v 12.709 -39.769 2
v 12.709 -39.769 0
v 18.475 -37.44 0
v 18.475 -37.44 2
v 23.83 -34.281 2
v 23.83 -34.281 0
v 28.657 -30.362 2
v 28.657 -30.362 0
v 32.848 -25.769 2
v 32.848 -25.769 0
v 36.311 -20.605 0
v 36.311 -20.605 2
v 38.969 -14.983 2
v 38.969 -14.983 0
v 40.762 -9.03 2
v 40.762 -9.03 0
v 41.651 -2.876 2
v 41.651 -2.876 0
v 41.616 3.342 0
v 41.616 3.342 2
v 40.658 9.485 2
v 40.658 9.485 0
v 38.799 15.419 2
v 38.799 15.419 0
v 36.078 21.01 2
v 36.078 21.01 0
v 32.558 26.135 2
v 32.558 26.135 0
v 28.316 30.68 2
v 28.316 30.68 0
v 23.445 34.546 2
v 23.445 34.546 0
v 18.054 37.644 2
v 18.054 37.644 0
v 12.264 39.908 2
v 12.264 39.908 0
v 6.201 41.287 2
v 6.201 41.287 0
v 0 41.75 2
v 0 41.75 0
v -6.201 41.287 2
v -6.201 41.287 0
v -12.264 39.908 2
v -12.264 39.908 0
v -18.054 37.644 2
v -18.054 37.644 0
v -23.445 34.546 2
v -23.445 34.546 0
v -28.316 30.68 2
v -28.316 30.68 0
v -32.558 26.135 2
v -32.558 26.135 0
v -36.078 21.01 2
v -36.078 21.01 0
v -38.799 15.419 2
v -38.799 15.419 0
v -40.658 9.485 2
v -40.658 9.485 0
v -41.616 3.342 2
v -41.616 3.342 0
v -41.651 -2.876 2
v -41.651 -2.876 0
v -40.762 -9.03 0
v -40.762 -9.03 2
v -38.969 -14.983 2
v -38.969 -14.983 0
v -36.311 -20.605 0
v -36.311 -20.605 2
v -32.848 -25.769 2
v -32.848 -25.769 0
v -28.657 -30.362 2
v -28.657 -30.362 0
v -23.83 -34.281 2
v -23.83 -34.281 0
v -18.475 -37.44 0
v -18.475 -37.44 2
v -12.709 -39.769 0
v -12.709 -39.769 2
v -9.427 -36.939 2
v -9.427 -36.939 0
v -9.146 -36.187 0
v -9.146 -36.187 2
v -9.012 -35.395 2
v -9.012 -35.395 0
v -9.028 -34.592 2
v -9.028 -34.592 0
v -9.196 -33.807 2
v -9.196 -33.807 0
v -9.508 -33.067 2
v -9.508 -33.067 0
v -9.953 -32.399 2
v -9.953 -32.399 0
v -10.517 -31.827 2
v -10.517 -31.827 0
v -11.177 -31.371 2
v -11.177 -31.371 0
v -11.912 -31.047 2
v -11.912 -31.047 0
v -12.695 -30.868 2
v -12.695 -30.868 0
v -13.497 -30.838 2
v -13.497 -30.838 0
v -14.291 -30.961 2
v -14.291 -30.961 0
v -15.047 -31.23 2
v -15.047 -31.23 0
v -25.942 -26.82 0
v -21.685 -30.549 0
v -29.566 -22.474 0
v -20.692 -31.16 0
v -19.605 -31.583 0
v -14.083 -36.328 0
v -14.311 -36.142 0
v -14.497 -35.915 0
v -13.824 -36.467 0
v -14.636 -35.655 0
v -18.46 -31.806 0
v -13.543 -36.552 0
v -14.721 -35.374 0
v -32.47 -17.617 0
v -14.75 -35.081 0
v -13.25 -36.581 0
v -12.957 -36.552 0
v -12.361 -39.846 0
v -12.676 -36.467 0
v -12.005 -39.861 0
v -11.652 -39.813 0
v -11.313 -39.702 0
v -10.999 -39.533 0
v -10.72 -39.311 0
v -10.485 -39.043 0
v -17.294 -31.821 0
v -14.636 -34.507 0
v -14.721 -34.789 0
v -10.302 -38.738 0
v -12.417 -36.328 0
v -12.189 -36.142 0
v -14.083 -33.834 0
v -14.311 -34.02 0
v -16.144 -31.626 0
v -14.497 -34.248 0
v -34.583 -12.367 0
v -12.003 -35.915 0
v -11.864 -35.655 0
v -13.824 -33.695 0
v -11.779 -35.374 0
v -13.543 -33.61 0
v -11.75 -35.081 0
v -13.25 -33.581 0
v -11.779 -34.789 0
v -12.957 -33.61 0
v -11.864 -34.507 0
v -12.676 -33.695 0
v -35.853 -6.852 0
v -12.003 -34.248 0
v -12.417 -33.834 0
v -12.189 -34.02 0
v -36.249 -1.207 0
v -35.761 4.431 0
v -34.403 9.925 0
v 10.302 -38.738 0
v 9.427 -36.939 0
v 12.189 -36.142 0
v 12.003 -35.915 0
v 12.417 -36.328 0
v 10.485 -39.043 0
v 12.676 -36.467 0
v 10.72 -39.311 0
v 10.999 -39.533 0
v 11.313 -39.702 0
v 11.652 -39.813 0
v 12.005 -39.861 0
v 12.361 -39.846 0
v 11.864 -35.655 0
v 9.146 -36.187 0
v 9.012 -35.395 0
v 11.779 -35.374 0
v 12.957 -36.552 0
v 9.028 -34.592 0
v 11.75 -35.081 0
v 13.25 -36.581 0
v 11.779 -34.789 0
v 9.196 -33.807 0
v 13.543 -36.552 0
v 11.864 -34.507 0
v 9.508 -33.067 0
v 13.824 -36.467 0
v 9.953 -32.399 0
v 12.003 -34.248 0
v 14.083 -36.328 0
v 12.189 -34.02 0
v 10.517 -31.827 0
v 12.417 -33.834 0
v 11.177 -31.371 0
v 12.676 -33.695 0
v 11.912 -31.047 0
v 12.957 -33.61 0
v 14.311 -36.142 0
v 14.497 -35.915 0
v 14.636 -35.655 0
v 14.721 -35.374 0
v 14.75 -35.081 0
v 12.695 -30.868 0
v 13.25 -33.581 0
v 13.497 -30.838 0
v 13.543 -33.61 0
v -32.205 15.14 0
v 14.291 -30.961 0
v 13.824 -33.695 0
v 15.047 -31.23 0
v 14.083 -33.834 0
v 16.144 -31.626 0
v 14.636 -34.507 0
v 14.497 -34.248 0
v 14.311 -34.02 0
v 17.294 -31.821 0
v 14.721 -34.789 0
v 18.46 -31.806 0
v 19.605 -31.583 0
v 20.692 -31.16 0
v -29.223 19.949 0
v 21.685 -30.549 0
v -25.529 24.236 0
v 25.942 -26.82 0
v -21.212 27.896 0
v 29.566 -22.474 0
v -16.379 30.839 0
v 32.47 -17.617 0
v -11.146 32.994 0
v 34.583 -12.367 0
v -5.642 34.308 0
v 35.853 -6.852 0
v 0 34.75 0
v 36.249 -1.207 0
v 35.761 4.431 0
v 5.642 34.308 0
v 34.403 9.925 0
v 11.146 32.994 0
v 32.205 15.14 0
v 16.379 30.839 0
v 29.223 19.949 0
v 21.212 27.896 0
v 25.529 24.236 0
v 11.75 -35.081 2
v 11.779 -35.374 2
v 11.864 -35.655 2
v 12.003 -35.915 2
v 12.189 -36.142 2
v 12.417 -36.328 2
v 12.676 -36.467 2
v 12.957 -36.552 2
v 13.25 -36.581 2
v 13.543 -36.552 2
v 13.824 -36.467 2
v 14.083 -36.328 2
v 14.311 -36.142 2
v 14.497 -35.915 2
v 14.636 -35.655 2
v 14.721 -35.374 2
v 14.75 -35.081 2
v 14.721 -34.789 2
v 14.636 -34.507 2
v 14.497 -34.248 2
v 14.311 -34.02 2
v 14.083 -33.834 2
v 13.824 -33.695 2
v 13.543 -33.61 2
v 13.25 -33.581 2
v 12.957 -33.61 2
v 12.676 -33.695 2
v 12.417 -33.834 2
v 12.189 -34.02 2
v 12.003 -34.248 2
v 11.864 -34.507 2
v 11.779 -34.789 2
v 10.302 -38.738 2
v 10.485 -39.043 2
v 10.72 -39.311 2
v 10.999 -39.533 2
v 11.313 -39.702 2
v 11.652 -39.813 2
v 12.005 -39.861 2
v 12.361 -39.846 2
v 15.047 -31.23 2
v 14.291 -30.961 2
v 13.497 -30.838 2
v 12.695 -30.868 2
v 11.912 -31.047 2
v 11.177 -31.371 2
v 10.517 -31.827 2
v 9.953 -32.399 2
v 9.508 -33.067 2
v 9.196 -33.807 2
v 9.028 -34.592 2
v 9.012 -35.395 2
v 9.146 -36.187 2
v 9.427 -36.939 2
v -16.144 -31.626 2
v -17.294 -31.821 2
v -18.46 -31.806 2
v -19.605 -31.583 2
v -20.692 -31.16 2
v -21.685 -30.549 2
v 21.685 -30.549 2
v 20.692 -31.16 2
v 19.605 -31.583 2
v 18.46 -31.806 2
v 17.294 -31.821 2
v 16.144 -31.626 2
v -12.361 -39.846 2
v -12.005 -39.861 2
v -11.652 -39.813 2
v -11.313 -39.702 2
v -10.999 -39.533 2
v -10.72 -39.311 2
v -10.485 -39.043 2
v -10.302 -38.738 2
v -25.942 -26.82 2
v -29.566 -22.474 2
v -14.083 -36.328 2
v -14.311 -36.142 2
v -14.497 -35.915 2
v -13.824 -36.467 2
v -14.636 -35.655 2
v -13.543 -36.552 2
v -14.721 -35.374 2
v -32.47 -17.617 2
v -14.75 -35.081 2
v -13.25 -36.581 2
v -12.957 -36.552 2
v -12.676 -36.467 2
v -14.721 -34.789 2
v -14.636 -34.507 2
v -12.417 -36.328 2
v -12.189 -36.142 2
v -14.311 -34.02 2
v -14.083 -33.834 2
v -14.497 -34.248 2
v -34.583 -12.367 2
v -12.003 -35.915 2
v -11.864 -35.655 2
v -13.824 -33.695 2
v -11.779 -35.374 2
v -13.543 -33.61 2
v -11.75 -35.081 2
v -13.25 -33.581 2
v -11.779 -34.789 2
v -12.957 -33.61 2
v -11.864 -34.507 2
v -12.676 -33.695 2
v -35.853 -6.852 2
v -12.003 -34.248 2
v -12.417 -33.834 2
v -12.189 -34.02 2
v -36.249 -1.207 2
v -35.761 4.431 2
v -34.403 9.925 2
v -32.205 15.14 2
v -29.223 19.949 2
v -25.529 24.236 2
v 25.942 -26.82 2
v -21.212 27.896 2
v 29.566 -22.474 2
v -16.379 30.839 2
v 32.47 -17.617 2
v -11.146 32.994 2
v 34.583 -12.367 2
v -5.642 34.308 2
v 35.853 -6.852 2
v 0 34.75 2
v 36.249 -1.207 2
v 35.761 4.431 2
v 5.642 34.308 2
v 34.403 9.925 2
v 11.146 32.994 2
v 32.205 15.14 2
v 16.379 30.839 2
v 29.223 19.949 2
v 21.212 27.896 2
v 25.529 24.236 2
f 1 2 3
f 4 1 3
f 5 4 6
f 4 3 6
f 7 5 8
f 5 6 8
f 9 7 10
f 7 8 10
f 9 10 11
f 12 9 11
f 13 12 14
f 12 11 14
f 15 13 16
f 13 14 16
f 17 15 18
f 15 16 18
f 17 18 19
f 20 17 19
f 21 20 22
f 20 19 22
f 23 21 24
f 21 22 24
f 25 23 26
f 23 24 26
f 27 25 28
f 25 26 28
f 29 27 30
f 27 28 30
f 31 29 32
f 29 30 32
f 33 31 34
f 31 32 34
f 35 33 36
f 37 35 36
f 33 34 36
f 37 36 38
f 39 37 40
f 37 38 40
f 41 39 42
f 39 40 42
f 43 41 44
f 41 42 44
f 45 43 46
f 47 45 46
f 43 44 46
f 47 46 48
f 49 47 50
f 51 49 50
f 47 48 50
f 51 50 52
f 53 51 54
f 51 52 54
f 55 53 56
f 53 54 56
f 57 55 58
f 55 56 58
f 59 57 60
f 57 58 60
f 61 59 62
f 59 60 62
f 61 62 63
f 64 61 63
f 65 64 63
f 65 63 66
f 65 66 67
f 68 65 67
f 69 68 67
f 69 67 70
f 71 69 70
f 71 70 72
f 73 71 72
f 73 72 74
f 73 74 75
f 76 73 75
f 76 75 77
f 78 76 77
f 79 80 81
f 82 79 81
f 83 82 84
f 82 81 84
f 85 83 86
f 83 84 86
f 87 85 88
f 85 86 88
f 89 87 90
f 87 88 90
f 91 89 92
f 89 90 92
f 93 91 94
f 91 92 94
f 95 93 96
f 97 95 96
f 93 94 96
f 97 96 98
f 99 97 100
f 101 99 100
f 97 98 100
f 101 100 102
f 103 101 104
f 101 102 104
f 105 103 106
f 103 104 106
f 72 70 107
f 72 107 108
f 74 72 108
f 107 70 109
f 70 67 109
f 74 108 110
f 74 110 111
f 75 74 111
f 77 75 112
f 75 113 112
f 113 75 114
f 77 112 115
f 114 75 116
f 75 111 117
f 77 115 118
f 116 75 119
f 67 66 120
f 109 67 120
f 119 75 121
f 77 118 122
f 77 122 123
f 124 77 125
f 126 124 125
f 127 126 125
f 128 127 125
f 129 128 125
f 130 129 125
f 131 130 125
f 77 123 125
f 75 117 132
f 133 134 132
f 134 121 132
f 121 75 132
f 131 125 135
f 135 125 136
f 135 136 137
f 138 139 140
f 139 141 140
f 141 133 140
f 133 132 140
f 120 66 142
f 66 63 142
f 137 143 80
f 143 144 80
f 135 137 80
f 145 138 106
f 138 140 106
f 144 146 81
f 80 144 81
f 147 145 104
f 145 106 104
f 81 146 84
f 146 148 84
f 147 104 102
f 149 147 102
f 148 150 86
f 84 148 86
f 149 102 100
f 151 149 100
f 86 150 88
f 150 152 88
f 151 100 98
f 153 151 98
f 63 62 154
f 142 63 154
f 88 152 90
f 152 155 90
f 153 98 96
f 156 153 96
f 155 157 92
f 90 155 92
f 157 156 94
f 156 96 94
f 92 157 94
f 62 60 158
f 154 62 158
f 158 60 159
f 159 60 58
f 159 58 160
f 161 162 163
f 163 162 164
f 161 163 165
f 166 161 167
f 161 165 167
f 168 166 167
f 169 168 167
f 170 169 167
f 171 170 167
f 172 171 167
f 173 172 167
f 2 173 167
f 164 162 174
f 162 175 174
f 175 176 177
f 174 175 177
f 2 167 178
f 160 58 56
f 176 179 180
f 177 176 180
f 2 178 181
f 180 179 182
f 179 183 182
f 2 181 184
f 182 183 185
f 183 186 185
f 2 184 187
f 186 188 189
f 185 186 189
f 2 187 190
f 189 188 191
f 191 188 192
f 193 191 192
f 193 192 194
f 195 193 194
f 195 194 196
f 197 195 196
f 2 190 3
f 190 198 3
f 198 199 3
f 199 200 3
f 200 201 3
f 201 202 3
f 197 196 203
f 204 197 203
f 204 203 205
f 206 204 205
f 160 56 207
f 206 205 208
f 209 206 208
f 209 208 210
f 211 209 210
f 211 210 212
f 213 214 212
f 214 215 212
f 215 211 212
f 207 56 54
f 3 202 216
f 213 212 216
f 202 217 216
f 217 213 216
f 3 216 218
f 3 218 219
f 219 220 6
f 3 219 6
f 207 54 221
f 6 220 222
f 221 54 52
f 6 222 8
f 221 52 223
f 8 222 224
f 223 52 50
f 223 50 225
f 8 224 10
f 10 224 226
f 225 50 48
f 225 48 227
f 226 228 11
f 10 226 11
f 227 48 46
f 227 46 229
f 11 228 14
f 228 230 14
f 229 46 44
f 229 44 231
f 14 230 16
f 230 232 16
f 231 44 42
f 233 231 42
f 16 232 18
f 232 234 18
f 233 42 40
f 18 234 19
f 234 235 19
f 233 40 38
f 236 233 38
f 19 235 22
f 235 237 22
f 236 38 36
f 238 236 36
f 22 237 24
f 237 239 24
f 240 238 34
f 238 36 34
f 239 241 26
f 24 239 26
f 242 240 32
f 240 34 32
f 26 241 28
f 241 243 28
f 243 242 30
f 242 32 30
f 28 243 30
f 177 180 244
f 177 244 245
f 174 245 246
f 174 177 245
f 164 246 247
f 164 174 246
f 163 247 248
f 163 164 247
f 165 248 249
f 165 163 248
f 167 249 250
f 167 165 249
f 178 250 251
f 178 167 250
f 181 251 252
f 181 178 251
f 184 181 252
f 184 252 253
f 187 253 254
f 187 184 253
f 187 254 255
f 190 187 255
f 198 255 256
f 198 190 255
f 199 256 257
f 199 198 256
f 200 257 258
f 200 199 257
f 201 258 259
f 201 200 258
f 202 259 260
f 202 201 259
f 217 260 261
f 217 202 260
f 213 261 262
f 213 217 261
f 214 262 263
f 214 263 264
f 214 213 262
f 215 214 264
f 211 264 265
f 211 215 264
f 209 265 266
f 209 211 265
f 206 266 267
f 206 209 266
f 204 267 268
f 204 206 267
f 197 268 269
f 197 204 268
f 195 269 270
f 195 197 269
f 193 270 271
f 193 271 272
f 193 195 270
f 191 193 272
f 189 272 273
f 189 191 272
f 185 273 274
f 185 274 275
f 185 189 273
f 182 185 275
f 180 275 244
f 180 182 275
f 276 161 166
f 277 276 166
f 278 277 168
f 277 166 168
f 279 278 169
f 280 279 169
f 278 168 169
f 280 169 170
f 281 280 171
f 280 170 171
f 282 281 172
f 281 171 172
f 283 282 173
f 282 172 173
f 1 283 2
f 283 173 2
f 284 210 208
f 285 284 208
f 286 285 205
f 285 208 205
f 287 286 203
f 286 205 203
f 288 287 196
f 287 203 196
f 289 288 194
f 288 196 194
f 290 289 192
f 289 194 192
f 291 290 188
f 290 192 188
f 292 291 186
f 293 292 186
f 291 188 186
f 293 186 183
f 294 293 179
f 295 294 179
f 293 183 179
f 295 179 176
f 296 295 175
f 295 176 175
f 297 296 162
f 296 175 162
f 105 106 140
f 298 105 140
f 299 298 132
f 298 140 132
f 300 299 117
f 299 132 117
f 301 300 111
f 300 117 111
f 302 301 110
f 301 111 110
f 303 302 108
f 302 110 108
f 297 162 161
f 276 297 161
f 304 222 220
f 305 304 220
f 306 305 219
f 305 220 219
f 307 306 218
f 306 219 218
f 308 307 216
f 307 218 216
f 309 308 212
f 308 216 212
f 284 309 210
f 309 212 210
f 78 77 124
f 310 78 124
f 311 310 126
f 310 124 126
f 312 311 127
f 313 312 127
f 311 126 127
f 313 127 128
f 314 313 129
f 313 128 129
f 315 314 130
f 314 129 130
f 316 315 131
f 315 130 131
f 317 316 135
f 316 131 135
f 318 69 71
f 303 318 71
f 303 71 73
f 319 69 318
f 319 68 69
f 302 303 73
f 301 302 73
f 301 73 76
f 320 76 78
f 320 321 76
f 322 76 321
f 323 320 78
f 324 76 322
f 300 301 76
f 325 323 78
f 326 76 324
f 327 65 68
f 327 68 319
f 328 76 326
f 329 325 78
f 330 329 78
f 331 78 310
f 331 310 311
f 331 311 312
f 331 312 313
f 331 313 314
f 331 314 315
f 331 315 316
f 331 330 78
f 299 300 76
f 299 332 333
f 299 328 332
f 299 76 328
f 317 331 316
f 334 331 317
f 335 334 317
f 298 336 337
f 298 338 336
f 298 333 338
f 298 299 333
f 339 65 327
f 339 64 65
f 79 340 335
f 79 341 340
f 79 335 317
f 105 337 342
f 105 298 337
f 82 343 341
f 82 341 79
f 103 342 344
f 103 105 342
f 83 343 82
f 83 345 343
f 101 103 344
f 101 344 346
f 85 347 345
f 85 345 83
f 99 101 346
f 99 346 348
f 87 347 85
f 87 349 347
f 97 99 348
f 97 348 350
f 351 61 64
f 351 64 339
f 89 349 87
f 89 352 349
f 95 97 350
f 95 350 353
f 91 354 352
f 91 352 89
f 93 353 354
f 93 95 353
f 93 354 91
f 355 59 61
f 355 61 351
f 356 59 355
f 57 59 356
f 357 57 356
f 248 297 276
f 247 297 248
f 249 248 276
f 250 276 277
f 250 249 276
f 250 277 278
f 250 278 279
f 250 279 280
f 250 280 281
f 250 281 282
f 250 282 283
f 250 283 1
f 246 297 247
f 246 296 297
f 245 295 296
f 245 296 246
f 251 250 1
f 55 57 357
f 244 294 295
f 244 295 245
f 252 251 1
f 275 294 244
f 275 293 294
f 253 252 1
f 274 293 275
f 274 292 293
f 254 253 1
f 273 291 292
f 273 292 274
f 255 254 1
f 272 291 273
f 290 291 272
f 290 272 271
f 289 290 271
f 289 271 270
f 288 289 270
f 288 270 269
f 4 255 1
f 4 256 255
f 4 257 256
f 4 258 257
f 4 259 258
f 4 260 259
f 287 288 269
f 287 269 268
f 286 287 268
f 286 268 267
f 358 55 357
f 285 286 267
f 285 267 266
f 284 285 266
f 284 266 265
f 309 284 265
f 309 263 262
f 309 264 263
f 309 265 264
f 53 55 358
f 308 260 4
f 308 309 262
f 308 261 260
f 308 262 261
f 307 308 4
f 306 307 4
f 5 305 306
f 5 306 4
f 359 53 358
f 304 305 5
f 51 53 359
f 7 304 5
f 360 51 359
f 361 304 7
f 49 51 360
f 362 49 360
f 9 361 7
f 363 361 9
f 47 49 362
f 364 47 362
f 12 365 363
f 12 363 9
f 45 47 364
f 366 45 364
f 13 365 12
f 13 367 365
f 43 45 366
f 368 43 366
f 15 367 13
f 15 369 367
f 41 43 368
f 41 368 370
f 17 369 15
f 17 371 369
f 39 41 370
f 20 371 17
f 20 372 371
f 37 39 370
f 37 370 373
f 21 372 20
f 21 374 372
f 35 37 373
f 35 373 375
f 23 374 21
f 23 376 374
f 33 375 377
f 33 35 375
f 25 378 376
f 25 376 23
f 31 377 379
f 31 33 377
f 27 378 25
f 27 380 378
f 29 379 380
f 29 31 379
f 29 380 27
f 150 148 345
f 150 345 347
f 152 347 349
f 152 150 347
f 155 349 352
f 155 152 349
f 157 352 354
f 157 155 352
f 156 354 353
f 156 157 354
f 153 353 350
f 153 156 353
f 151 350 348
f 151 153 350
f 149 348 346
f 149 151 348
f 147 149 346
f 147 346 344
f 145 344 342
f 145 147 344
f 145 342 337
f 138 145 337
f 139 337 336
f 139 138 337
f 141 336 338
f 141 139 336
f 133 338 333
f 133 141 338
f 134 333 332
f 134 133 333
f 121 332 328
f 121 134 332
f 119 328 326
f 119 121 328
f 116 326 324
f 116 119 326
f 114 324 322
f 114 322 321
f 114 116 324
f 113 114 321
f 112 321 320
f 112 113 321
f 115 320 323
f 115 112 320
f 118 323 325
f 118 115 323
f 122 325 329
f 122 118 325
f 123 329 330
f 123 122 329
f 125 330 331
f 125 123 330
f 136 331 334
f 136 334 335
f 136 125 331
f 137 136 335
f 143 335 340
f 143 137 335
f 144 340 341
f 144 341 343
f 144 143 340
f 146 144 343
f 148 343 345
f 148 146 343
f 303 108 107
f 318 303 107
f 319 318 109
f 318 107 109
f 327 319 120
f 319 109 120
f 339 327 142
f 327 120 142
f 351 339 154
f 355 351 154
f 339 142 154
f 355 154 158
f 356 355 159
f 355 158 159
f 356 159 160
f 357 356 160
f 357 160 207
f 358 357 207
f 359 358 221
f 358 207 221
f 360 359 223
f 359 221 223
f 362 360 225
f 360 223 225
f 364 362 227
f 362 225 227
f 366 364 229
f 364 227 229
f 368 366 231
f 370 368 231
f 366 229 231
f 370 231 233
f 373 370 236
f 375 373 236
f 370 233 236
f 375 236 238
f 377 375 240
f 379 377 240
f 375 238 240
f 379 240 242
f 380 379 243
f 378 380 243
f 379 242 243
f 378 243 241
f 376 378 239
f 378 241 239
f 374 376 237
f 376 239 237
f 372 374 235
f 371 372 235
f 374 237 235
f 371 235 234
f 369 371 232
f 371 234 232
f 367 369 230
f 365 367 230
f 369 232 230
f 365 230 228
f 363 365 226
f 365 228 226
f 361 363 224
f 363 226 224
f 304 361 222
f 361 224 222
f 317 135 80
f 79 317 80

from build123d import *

# Parameters (mm, degrees)
SKETCH_1_R          = 1.5
EXTRUDE_8_165_DEPTH = 2


with BuildPart() as part:
    # Эскиз1 → Бобышка8-165 (new body)
    with BuildSketch(Plane.XY):
        with BuildLine():
            Line((-10.301660458, -38.737628793), (-9.427477508, -36.938794679))
            ThreePointArc((-9.427477508, -36.938794679), (-10.221334445, -32.099598439), (-15.047492413, -31.229984527))
            ThreePointArc((-15.047492413, -31.229984527), (-18.460300533, -31.805984271), (-21.684930892, -30.54868796))
            ThreePointArc((-21.684930892, -30.54868796), (0, 34.75), (21.684930892, -30.54868796))
            ThreePointArc((21.684930892, -30.54868796), (18.460300533, -31.805984271), (15.047492413, -31.229984527))
            ThreePointArc((15.047492413, -31.229984527), (10.221334445, -32.099598439), (9.427477508, -36.938794679))
            Line((9.427477508, -36.938794679), (10.301660458, -38.737628793))
            ThreePointArc((10.301660458, -38.737628793), (11.313275299, -39.702001205), (12.709324487, -39.768524879))
            ThreePointArc((12.709324487, -39.768524879), (0, 41.75), (-12.709324487, -39.768524879))
            ThreePointArc((-12.709324487, -39.768524879), (-11.313275299, -39.702001205), (-10.301660458, -38.737628793))
        make_face()
        with Locations((-13.25, -35.08115591)):
            Circle(SKETCH_1_R, mode=Mode.SUBTRACT)
        with Locations(Location((13.25, -35.08115591, 0), (0, 0, 180))):
            Circle(SKETCH_1_R, mode=Mode.SUBTRACT)
    extrude(amount=EXTRUDE_8_165_DEPTH)


solid = part.part
